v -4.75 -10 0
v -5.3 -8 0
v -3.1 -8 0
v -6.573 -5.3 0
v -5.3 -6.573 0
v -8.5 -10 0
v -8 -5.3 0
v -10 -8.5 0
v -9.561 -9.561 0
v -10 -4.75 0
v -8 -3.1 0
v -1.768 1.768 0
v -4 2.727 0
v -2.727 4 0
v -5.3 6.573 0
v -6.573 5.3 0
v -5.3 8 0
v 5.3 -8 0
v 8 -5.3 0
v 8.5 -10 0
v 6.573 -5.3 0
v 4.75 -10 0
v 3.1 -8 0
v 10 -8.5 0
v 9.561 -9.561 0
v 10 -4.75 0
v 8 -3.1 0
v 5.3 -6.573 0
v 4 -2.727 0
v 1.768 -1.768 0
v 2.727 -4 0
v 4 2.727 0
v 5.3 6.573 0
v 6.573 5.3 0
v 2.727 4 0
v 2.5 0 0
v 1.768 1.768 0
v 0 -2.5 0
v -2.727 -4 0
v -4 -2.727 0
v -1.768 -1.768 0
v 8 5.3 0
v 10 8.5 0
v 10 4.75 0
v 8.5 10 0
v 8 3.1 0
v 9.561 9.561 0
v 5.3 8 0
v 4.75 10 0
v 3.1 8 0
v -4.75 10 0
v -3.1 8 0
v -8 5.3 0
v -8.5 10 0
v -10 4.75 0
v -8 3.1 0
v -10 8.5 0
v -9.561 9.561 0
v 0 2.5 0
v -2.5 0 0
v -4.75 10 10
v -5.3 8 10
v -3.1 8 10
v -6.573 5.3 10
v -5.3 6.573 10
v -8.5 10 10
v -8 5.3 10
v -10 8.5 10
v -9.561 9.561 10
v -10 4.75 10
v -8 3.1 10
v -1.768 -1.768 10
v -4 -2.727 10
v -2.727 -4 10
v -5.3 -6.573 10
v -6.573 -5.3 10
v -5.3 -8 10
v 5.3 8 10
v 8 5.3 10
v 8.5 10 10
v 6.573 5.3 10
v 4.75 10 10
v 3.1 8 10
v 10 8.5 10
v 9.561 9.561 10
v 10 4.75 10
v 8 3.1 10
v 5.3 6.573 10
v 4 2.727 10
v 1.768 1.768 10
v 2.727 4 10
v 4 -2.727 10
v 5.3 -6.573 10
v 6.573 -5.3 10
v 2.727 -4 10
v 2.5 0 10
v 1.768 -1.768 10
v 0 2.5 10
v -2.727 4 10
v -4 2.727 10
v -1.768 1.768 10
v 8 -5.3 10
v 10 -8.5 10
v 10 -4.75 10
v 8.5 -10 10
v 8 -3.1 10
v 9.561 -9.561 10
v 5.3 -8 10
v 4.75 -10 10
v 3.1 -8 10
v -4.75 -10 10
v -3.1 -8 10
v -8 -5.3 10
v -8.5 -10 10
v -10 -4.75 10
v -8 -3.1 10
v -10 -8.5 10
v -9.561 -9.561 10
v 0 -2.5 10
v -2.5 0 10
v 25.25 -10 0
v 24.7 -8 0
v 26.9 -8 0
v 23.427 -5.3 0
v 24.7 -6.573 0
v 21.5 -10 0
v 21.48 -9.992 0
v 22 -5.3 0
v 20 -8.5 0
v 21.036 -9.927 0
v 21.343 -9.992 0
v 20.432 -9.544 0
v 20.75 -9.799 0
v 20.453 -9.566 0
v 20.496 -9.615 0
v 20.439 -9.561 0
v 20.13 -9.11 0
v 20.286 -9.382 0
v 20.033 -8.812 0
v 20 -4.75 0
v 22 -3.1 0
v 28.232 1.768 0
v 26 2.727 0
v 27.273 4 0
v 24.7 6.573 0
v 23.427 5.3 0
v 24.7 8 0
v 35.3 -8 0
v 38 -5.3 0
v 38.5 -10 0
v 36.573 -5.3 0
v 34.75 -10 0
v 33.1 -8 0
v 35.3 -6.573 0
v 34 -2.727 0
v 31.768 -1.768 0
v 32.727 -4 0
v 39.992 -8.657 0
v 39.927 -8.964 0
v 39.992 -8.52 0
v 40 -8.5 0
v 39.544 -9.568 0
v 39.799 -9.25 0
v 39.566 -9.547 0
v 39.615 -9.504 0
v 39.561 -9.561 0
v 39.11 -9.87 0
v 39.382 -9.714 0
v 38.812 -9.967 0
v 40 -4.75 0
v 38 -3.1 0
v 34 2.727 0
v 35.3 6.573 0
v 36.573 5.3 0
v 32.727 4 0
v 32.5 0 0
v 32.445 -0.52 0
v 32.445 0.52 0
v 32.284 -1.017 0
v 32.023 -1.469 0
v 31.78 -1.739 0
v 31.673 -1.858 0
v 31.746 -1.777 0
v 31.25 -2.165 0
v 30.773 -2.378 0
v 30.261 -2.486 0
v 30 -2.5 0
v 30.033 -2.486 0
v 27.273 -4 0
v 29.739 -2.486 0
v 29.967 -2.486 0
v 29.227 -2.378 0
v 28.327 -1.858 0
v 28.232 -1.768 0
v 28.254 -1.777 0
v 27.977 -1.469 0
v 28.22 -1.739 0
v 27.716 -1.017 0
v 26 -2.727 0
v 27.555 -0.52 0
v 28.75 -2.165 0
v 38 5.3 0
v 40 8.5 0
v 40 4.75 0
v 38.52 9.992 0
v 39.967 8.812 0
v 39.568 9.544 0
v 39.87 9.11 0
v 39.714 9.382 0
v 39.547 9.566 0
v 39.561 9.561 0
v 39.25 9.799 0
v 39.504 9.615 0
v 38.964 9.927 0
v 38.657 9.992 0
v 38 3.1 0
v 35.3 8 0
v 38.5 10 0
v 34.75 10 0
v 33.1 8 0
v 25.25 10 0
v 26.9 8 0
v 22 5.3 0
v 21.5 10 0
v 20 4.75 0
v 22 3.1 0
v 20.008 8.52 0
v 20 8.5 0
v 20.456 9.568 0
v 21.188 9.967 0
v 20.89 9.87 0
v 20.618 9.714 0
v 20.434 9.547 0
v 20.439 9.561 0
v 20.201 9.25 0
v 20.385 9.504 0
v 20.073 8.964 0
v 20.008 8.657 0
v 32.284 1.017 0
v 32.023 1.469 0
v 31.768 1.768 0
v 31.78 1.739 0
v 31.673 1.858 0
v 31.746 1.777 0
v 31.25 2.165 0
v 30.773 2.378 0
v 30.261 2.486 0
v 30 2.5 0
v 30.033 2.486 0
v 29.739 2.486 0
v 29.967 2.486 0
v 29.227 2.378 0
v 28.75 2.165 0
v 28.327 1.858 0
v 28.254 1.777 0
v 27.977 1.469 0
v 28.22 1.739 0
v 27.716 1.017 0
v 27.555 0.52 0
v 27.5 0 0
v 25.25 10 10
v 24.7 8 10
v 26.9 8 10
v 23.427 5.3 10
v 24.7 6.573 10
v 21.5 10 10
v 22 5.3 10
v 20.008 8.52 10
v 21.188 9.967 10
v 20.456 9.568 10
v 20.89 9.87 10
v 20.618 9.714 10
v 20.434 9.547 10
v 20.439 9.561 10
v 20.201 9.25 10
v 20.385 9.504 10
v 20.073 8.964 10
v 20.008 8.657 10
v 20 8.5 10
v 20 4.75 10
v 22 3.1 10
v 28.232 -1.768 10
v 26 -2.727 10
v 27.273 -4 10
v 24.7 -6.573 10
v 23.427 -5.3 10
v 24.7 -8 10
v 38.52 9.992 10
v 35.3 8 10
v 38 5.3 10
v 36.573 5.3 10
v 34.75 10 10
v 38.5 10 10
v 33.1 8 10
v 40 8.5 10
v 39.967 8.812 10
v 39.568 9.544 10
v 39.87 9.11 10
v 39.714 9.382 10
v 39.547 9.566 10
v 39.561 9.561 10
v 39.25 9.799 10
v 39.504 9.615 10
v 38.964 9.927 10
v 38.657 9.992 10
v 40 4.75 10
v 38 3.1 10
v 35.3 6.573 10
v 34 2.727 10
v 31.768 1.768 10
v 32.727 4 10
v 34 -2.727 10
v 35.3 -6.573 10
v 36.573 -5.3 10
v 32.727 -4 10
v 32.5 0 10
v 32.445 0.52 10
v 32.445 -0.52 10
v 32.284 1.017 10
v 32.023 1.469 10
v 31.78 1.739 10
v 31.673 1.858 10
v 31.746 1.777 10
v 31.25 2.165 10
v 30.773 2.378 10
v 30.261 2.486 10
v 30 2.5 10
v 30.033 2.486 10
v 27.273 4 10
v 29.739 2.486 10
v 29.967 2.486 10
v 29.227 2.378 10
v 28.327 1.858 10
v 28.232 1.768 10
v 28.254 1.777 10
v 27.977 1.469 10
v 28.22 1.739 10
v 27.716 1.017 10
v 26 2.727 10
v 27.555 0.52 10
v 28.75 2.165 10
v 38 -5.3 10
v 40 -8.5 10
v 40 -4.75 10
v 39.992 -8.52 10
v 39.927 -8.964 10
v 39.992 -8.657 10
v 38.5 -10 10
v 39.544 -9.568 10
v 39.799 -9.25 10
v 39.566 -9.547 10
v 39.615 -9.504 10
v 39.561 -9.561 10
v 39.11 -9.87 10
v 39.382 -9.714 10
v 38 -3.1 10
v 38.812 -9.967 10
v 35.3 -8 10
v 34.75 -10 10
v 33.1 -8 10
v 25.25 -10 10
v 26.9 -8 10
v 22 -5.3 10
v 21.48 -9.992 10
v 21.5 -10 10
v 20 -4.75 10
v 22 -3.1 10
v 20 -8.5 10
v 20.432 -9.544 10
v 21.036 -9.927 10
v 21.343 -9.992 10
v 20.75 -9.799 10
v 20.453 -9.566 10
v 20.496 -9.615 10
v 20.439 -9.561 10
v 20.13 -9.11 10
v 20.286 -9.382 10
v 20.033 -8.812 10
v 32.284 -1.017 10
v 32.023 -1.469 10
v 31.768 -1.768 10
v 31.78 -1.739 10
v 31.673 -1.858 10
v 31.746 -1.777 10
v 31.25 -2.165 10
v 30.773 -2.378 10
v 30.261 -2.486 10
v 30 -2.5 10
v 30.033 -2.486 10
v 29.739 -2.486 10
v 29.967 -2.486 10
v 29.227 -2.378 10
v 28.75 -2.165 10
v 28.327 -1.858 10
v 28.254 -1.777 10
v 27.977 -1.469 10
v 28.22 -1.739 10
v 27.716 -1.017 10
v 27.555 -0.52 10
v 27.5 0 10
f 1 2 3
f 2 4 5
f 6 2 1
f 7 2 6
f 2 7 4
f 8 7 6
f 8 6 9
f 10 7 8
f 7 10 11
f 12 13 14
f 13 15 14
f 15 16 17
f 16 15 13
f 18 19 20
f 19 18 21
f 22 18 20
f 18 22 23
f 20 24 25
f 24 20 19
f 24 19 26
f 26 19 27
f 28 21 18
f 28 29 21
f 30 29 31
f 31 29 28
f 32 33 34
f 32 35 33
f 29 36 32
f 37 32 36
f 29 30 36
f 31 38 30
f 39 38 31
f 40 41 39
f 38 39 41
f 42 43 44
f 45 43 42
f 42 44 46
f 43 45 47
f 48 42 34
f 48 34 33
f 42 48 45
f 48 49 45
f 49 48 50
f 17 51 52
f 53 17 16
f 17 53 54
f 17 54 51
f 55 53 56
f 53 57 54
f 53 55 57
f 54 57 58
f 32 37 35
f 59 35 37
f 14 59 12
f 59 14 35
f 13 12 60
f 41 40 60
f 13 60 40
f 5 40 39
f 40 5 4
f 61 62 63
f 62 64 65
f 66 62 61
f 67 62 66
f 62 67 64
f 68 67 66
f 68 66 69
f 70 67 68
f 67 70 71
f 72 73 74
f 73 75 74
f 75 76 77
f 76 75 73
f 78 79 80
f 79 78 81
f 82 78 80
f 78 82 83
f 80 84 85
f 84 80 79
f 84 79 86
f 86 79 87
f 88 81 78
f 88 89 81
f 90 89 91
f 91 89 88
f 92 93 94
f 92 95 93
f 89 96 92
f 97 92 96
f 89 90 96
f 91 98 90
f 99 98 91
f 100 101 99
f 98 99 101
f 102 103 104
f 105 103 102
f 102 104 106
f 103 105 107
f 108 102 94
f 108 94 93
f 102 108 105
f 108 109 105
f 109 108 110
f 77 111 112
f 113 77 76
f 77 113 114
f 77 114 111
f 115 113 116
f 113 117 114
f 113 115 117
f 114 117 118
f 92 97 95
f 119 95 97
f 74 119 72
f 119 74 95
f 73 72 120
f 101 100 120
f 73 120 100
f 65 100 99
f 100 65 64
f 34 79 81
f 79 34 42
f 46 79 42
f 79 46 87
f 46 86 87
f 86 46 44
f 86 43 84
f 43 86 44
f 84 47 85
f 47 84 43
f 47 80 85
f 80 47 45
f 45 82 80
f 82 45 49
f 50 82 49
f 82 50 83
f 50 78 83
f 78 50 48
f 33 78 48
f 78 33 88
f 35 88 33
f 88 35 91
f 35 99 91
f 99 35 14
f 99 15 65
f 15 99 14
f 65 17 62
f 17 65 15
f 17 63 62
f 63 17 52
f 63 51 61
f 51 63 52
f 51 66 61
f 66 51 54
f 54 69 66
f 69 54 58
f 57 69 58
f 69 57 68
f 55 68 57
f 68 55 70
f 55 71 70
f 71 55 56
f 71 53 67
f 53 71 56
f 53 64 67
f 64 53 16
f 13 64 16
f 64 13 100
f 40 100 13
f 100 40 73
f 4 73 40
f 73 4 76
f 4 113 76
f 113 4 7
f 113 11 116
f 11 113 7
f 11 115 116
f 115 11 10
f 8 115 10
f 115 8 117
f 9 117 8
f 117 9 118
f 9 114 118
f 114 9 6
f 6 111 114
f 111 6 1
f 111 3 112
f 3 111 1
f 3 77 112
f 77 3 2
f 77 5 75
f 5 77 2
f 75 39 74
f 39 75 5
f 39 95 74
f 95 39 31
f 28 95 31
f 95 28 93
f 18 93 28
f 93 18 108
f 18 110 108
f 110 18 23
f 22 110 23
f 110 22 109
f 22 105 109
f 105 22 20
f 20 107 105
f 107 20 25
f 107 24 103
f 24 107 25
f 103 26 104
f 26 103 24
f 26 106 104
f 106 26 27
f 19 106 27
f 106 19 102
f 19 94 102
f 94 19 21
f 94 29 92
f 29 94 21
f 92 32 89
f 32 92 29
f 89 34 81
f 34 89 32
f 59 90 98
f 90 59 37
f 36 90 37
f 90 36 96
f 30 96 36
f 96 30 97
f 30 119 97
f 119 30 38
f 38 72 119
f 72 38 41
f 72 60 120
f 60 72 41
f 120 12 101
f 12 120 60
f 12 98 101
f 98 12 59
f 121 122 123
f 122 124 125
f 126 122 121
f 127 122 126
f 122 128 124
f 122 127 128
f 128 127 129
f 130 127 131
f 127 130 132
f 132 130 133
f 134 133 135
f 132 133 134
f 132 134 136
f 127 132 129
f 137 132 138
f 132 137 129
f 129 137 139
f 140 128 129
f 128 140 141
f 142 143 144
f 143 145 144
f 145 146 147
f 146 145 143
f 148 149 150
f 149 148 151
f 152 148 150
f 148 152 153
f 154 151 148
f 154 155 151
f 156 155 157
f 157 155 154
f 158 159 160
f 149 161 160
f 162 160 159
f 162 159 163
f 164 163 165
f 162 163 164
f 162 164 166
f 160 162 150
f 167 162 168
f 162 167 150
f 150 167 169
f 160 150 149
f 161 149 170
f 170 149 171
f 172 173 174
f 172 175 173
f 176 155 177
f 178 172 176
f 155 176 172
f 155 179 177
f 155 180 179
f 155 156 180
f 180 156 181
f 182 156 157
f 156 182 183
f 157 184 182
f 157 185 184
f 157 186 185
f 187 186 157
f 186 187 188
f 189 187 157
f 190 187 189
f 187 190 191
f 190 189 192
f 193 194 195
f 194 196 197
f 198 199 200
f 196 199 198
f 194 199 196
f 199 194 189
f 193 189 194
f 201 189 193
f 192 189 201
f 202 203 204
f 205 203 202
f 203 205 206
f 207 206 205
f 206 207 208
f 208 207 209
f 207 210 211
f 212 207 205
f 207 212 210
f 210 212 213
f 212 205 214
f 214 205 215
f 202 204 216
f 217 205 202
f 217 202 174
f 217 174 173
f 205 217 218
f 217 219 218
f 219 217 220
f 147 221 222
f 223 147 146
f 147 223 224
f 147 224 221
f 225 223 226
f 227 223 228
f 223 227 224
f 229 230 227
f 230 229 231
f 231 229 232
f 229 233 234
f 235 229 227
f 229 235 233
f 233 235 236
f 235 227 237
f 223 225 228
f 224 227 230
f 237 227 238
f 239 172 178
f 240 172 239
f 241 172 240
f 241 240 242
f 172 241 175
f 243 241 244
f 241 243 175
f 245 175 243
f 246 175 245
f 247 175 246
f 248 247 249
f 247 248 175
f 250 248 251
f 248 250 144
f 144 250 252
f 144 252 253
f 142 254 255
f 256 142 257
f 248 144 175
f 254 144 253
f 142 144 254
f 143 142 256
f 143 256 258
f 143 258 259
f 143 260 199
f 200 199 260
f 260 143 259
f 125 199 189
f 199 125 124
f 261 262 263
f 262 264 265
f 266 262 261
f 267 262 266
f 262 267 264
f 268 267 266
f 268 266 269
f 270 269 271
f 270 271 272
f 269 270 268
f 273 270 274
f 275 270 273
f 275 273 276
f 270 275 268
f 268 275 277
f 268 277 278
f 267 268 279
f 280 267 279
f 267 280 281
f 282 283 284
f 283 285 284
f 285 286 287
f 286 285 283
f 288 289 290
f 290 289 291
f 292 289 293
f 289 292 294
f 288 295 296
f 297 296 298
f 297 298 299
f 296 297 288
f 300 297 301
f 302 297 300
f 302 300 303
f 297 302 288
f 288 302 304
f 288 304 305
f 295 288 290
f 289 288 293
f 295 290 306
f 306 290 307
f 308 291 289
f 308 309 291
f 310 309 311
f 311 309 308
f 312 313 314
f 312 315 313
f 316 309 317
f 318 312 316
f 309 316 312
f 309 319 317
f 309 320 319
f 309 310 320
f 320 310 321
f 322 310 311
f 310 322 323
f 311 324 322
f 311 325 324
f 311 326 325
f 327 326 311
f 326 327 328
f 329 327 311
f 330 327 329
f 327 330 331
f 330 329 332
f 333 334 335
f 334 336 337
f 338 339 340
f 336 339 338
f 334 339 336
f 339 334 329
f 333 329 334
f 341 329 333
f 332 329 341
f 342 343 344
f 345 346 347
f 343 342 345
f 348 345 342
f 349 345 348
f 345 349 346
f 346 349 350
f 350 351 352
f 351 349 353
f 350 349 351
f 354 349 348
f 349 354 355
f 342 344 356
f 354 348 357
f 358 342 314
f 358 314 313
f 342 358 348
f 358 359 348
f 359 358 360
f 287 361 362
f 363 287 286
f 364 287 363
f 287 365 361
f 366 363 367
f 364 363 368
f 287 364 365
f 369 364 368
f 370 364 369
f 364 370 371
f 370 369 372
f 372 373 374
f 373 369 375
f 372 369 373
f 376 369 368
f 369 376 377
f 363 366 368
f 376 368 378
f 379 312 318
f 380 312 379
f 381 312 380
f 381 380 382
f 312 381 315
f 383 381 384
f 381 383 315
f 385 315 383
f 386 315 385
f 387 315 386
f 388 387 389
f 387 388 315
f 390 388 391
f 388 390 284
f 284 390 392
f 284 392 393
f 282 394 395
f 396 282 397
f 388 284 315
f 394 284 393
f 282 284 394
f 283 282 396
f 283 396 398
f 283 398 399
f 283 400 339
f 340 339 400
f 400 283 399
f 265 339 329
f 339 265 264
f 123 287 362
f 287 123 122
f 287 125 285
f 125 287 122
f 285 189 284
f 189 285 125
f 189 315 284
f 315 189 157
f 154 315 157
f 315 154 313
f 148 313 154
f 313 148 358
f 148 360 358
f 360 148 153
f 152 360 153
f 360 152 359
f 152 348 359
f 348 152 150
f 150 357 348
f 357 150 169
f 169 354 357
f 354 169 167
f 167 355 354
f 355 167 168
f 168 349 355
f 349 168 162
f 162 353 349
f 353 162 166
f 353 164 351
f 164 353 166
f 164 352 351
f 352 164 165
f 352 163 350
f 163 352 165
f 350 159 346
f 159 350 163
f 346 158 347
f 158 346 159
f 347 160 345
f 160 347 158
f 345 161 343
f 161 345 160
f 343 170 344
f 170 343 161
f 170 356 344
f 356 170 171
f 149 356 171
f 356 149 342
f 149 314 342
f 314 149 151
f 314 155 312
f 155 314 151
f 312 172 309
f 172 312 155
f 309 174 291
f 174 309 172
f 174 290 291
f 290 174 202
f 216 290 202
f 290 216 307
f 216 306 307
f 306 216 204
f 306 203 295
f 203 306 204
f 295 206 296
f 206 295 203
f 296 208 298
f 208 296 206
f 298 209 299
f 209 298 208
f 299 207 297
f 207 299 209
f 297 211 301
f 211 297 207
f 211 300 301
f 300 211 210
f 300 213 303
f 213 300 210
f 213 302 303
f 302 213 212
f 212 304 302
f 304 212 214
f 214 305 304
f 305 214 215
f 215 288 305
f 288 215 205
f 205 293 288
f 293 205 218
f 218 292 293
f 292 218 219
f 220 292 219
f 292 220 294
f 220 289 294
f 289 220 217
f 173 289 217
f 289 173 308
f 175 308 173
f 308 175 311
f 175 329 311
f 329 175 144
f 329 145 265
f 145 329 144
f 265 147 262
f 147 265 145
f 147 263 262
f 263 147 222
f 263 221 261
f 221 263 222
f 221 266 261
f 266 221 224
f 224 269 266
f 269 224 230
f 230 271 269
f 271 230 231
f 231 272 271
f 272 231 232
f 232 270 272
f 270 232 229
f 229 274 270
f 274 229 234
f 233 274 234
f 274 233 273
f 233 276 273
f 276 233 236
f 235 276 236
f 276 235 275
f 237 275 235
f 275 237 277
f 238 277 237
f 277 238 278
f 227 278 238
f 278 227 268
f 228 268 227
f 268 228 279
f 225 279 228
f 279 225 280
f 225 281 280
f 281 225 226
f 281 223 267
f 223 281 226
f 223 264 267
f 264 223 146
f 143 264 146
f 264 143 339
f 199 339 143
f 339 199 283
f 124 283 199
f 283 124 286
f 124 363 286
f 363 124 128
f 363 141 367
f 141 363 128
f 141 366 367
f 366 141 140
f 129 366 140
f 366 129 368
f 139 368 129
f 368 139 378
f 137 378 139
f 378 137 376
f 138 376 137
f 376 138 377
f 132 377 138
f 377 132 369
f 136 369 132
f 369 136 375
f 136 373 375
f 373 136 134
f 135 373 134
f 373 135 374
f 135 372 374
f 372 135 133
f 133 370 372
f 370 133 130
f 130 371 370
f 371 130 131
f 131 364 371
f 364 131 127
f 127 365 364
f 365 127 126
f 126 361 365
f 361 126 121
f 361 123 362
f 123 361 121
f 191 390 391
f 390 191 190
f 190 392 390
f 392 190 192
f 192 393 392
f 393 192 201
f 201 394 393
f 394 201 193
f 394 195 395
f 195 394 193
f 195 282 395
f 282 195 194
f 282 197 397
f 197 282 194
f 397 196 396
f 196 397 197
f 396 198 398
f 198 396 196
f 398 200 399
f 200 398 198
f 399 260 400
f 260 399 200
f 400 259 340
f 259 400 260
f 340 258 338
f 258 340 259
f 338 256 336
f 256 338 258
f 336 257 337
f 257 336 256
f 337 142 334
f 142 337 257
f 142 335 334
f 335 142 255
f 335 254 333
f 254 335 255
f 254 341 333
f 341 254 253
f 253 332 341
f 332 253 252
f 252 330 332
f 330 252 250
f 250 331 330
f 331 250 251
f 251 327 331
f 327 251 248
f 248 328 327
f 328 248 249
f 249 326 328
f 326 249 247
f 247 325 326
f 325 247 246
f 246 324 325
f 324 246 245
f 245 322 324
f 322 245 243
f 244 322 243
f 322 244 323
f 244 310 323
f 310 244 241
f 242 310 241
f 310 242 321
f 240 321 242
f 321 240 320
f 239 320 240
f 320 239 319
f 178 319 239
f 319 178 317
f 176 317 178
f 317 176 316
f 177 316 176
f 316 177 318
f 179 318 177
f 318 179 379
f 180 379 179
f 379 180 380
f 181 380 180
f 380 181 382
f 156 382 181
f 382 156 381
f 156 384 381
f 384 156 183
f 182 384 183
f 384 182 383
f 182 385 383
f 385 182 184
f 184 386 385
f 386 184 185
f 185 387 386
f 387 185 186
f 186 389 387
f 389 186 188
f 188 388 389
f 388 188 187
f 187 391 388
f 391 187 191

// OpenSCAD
// Aleksandr Saechnikov 17 june 2015

extrusion_profile_20x20_v_slot(size=20, height=10);
translate([30,0,0]) extrusion_profile_20x20_v_slot_smooth(size=20, height=10);

$fn = 30;

module extrusion_profile_20x20_v_slot(size=20, height=10) {
	linear_extrude(height=height) {
		union() {
			extrusion_profile_20x20_v_slot_part(size);
			rotate([0,0,90])  extrusion_profile_20x20_v_slot_part(size);
			rotate([0,0,180]) extrusion_profile_20x20_v_slot_part(size);
			rotate([0,0,270]) extrusion_profile_20x20_v_slot_part(size);
		}
	}
}

module extrusion_profile_20x20_v_slot_part(size=20) {
	d = 5;
	r = 1.5;
	s1 = 1.8;
	s2 = 2;
	s3 = 6;
	s4 = 6.2;
	s5 = 9.5;
	s6 = 10.6;
	s7 = 20;

	reSize = size/20; // Scalling

	k0 = 0;
	k1 = d*0.5*cos(45)*reSize;
	k2 = d*0.5*reSize;
	k3 = ( (s7*0.5-s3)-s1*0.5*sqrt(2) )*reSize;
	k4 = s4*0.5*reSize;
	k5 = ( s7*0.5-s3 )*reSize;
	k6 = s6*0.5*reSize;
	k7 = ( s6*0.5+s1*0.5*sqrt(2) )*reSize;
	k8 = ( s7*0.5-s2 )*reSize;
	k9 = s5*0.5*reSize;
	k10 = s7*0.5*reSize;
	k10_1 = k10-r*(1-cos(45))*reSize;
	k10_2 = k10-r*reSize;

	polygon(points=[
		[k1,k1],[k0,k2],[k0,k5],[k3,k5],
		[k6,k7],[k6,k8],[k4,k8],[k9,k10],
		[k10_2,k10],[k10_1,k10_1],
		[k10,k10_2],
		[k10,k9],[k8,k4],[k8,k6],[k7,k6],
		[k5,k3],[k5,k0],[k2,k0]
	]);
}

module extrusion_profile_20x20_v_slot_smooth(size=20, height=10) {
	linear_extrude(height=height) {
		difference() {	
			union() {
				extrusion_profile_20x20_v_slot_part_smooth(size);
				rotate([0,0,90])  extrusion_profile_20x20_v_slot_part_smooth(size);
				rotate([0,0,180]) extrusion_profile_20x20_v_slot_part_smooth(size);
				rotate([0,0,270]) extrusion_profile_20x20_v_slot_part_smooth(size);
			}
			circle([0,0],r=size/20.*2.5);
		}
	}
}

module extrusion_profile_20x20_v_slot_part_smooth(size=20) {
	r_center = 0.5*size-1.5*size/20;
	union() {
		translate ([r_center,r_center]) circle(r=1.5*size/20);
		extrusion_profile_20x20_v_slot_part(size);
	}
}
